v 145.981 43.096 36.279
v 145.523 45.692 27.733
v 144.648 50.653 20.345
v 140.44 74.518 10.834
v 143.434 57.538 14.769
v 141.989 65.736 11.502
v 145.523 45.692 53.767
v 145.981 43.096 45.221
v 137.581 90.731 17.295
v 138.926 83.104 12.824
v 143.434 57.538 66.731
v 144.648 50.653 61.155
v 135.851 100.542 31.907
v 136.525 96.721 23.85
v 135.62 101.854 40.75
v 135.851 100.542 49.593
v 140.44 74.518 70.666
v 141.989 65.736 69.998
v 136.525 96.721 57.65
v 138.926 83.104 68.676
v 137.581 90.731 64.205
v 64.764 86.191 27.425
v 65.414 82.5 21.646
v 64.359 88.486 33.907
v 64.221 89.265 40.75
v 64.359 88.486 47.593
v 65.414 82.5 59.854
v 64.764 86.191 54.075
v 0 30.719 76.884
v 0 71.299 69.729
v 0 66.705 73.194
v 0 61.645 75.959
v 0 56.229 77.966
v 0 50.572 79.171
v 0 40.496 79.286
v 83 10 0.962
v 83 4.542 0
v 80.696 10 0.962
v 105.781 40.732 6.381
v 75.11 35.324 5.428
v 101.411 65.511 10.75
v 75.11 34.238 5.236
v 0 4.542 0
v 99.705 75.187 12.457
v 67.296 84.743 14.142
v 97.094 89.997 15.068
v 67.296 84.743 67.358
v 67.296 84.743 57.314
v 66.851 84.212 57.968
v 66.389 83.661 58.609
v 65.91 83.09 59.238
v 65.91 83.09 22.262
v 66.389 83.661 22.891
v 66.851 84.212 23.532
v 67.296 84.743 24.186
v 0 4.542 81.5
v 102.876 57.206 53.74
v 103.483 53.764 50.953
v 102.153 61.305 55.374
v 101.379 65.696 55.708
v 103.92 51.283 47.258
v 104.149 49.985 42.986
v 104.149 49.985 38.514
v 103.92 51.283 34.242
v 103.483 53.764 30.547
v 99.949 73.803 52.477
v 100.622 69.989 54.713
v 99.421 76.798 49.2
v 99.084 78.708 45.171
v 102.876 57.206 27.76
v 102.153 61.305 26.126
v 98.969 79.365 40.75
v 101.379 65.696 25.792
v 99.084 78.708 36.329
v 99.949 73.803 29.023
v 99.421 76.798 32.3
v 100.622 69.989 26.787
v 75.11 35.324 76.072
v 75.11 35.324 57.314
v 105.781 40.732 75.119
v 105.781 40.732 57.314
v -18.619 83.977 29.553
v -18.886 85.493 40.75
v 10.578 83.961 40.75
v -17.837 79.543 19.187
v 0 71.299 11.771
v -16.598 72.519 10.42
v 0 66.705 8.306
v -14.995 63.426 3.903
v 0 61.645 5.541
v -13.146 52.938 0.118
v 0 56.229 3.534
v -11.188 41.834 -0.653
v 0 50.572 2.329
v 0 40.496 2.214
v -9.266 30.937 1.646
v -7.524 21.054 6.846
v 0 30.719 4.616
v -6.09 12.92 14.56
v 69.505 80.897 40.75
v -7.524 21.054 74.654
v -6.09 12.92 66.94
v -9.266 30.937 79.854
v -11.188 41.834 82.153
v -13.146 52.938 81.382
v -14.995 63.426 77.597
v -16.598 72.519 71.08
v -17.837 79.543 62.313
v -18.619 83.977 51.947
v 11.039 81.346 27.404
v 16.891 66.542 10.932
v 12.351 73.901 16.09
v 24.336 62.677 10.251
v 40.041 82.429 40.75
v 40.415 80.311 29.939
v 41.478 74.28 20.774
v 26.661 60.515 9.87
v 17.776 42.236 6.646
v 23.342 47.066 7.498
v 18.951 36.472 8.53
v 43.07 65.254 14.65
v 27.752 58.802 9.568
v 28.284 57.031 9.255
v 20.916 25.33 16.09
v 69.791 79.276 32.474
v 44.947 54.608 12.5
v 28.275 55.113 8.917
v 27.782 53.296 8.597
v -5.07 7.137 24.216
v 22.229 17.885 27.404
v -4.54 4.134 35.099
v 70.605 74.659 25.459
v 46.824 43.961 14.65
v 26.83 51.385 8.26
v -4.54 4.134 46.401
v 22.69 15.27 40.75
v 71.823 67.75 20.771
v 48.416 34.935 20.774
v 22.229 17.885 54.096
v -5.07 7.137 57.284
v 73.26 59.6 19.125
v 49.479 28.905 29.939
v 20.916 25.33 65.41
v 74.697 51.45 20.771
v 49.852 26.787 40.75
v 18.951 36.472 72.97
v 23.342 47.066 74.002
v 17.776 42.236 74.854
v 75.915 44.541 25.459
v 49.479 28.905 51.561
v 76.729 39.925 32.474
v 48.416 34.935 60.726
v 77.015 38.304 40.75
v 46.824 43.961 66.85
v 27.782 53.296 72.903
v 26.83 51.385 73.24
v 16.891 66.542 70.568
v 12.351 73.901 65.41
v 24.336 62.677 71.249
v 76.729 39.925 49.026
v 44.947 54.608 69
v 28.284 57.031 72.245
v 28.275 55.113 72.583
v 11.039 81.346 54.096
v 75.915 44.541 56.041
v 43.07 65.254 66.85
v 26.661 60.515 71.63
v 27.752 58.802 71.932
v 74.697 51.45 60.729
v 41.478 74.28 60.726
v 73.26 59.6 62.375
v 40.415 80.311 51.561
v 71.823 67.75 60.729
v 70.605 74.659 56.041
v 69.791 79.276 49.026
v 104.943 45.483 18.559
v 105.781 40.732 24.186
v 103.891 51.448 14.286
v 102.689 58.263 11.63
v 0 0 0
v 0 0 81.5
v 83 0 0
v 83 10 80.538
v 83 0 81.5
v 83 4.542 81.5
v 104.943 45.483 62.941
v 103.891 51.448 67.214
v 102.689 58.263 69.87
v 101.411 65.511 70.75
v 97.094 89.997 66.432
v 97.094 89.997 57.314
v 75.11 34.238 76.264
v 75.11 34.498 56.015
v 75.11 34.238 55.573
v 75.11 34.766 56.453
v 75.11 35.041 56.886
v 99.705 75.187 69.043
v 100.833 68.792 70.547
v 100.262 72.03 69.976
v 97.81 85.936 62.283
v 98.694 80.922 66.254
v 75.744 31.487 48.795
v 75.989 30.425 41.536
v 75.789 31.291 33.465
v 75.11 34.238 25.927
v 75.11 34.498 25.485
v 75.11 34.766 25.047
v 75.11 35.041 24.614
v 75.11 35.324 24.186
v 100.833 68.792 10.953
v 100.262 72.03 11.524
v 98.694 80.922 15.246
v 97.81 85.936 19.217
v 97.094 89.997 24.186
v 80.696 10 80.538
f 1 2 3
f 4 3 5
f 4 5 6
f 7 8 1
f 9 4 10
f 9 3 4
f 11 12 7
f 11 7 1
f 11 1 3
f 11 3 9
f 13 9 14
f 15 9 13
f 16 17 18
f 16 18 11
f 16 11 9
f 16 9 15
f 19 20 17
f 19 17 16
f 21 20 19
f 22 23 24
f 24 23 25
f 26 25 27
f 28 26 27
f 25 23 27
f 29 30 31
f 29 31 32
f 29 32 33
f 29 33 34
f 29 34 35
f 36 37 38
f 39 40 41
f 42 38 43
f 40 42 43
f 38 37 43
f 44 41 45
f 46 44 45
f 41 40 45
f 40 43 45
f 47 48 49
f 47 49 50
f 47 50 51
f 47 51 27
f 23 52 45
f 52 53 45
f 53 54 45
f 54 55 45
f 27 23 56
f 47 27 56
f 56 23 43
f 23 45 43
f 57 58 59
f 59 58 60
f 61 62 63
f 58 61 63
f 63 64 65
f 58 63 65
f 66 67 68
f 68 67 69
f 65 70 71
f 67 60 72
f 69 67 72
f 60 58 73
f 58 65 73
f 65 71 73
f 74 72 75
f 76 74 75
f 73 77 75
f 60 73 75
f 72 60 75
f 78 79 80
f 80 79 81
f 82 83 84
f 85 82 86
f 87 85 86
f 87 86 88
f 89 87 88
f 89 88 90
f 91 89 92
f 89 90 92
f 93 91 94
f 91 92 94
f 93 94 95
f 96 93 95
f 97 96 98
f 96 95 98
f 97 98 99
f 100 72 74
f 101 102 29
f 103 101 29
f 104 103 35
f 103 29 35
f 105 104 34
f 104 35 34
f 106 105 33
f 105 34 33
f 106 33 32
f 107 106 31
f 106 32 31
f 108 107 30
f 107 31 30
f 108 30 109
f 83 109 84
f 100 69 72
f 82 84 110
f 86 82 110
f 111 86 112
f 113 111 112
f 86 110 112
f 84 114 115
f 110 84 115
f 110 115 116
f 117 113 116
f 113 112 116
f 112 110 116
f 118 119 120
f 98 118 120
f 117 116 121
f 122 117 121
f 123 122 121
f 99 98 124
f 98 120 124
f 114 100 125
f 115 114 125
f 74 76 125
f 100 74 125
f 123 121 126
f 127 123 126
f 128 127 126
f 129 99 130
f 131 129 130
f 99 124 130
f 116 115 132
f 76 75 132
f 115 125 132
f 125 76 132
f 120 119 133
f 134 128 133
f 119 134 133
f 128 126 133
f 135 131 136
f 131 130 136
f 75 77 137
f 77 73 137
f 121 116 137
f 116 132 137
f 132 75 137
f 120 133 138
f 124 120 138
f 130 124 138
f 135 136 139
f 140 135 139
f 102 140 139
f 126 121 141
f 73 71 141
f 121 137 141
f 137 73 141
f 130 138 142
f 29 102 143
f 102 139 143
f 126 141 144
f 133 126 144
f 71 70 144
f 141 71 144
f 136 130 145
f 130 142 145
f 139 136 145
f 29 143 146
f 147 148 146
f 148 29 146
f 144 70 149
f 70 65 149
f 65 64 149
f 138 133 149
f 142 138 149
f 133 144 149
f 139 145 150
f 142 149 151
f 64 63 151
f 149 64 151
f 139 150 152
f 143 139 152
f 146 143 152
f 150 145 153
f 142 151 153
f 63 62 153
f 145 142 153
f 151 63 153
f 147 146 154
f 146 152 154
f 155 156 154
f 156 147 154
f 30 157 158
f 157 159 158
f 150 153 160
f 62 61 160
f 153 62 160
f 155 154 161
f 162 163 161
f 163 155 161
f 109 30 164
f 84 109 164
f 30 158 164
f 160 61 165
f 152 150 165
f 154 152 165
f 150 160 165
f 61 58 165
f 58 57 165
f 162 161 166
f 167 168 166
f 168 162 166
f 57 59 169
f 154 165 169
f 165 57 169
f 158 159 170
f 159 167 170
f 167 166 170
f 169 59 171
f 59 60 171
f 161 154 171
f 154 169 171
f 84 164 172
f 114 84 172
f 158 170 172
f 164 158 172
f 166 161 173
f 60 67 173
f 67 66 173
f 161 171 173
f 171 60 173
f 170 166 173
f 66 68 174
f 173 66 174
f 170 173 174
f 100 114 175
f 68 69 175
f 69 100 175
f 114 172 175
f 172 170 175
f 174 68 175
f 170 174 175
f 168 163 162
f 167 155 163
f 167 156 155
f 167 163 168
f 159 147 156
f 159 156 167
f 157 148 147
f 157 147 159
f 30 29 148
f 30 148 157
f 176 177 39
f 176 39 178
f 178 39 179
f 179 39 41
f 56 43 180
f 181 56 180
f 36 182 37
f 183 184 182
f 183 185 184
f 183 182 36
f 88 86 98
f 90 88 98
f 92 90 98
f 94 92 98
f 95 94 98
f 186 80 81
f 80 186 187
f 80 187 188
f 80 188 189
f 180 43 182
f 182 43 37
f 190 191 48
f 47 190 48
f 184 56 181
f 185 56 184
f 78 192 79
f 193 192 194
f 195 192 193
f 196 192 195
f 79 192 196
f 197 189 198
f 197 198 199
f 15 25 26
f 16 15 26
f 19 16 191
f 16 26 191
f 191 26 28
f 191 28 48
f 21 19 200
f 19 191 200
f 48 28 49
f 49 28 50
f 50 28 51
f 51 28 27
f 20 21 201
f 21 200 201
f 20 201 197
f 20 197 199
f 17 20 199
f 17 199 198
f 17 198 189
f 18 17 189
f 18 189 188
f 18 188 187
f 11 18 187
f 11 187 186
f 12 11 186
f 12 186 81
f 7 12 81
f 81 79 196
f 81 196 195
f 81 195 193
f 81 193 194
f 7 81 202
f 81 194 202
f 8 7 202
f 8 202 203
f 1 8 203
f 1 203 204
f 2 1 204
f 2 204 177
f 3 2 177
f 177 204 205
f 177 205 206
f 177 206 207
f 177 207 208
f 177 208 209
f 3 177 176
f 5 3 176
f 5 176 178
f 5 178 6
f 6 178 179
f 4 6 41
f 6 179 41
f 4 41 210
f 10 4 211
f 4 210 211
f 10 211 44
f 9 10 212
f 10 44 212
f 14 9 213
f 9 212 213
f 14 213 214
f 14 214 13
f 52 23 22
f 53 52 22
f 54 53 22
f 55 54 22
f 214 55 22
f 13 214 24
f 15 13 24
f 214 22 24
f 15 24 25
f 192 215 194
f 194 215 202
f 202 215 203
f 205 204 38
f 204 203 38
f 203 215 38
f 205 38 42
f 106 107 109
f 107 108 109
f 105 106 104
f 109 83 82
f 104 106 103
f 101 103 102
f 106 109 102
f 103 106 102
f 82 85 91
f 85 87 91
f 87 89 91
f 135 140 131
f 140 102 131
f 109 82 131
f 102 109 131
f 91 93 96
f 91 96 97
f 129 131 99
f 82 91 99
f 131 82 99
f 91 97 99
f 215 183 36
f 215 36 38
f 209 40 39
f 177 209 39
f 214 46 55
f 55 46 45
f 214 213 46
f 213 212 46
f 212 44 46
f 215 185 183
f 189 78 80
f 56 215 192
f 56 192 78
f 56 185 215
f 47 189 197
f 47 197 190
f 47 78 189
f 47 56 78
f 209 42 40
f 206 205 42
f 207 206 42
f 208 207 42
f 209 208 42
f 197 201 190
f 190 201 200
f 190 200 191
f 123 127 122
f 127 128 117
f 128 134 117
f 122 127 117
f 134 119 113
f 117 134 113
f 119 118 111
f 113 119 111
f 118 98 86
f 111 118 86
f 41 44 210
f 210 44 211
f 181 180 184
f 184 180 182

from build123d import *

# Parameters (mm, degrees)
EXTRUDE_1_DEPTH      = 81.5
EXTRUDE_2_DEPTH      = 40
EXTRUDE_2_DEPTH_BACK = 32.5
SKETCH_3_R           = 30
EXTRUDE_3_DEPTH      = 81.5
CUT_EXTRUDE_1_REACH  = 198.129


with BuildPart() as part:
    # 草图2 → 凸台-拉伸1 (new body)
    with BuildSketch(Plane.XY):
        Polygon((0, 0), (83, 0), (75.110468057, 34.237591451), (75.110468057, 35.32376219), (105.780577321, 40.731729955), (97.093810418, 89.996833162), (67.296196513, 84.74270987), (0, 4.542225907), align=None)
    extrude(amount=EXTRUDE_1_DEPTH)

    # 草图3 → 凸台-拉伸2 (add, two sides: drawn at the far end of the back side and taken through both)
    with BuildSketch(Plane(origin=(109.556438685, 19.31775605, 0), x_dir=(0, 0, -1), z_dir=(0.98480775301221, 0.1736481776669192, 0)).offset(-EXTRUDE_2_DEPTH_BACK)):
        with Locations(Location((-40.75, 46.756867386, 0), (0, 0, 90))):
            Circle(SKETCH_3_R)
    extrude(amount=EXTRUDE_2_DEPTH + EXTRUDE_2_DEPTH_BACK)

    # 草图4 → 凸台-拉伸3 (add)
    with BuildSketch(Plane.XY.offset(81.5)):
        Polygon((83, 0), (83, 10), (80.695652174, 10), align=None)
    extrude(amount=-EXTRUDE_3_DEPTH)


with BuildPart() as body_2:
    # 草图5 → 旋转1 (revolve)
    with BuildSketch(Plane.XY.offset(40.75)):
        Polygon((-11.679618663, 44.622998406), (-18.886018036, 85.492520156), (98.968550269, 79.364655133), (101.573272934, 64.592538838), align=None)
    revolve(axis=Axis((101.573272934, 64.592538838, 40.75), (-0.9848077530122099, -0.17364817766691962, 0)))


with BuildPart() as cut_extrude_1_tool:
    # 切除-拉伸1: up to this plane
    cut_extrude_1_end = Plane(origin=(105.780577321, 40.731729955, 81.5), z_dir=(-0.98480775301221, -0.17364817766691973, 0))
    # 草图7 → 切除-拉伸1 (new, up to the surface)
    with BuildSketch(Plane.ZY, mode=Mode.PRIVATE) as cut_extrude_1_sk1:
        Polygon((0, 4.542225907), (15.067952885, 89.996833162), (0, 89.996833162), align=None)
    cut_extrude_1_tool1 = split(extrude(cut_extrude_1_sk1.sketch, amount=-CUT_EXTRUDE_1_REACH, mode=Mode.PRIVATE), bisect_by=cut_extrude_1_end, keep=Keep.BOTH, mode=Mode.PRIVATE)
    add(cut_extrude_1_tool1.solids().sort_by_distance((0, 61.511964, 5.022651))[0])
    # 草图7 → 切除-拉伸1 (new, up to the surface)
    with BuildSketch(Plane.ZY, mode=Mode.PRIVATE) as cut_extrude_1_sk2:
        Polygon((81.5, 89.996833162), (81.5, 4.542225907), (66.432047115, 89.996833162), align=None)
    cut_extrude_1_tool2 = split(extrude(cut_extrude_1_sk2.sketch, amount=-CUT_EXTRUDE_1_REACH, mode=Mode.PRIVATE), bisect_by=cut_extrude_1_end, keep=Keep.BOTH, mode=Mode.PRIVATE)
    add(cut_extrude_1_tool2.solids().sort_by_distance((0, 61.511964, 76.477349))[0])


with BuildPart() as part_1:
    add(part.part)

    # 切除-拉伸1: cut by cut_extrude_1_tool
    add(cut_extrude_1_tool.part, mode=Mode.SUBTRACT)


with BuildPart() as body_2_1:
    add(body_2.part)

    # 切除-拉伸1: cut by cut_extrude_1_tool
    add(cut_extrude_1_tool.part, mode=Mode.SUBTRACT)


solid = Compound([part_1.part, body_2_1.part])
